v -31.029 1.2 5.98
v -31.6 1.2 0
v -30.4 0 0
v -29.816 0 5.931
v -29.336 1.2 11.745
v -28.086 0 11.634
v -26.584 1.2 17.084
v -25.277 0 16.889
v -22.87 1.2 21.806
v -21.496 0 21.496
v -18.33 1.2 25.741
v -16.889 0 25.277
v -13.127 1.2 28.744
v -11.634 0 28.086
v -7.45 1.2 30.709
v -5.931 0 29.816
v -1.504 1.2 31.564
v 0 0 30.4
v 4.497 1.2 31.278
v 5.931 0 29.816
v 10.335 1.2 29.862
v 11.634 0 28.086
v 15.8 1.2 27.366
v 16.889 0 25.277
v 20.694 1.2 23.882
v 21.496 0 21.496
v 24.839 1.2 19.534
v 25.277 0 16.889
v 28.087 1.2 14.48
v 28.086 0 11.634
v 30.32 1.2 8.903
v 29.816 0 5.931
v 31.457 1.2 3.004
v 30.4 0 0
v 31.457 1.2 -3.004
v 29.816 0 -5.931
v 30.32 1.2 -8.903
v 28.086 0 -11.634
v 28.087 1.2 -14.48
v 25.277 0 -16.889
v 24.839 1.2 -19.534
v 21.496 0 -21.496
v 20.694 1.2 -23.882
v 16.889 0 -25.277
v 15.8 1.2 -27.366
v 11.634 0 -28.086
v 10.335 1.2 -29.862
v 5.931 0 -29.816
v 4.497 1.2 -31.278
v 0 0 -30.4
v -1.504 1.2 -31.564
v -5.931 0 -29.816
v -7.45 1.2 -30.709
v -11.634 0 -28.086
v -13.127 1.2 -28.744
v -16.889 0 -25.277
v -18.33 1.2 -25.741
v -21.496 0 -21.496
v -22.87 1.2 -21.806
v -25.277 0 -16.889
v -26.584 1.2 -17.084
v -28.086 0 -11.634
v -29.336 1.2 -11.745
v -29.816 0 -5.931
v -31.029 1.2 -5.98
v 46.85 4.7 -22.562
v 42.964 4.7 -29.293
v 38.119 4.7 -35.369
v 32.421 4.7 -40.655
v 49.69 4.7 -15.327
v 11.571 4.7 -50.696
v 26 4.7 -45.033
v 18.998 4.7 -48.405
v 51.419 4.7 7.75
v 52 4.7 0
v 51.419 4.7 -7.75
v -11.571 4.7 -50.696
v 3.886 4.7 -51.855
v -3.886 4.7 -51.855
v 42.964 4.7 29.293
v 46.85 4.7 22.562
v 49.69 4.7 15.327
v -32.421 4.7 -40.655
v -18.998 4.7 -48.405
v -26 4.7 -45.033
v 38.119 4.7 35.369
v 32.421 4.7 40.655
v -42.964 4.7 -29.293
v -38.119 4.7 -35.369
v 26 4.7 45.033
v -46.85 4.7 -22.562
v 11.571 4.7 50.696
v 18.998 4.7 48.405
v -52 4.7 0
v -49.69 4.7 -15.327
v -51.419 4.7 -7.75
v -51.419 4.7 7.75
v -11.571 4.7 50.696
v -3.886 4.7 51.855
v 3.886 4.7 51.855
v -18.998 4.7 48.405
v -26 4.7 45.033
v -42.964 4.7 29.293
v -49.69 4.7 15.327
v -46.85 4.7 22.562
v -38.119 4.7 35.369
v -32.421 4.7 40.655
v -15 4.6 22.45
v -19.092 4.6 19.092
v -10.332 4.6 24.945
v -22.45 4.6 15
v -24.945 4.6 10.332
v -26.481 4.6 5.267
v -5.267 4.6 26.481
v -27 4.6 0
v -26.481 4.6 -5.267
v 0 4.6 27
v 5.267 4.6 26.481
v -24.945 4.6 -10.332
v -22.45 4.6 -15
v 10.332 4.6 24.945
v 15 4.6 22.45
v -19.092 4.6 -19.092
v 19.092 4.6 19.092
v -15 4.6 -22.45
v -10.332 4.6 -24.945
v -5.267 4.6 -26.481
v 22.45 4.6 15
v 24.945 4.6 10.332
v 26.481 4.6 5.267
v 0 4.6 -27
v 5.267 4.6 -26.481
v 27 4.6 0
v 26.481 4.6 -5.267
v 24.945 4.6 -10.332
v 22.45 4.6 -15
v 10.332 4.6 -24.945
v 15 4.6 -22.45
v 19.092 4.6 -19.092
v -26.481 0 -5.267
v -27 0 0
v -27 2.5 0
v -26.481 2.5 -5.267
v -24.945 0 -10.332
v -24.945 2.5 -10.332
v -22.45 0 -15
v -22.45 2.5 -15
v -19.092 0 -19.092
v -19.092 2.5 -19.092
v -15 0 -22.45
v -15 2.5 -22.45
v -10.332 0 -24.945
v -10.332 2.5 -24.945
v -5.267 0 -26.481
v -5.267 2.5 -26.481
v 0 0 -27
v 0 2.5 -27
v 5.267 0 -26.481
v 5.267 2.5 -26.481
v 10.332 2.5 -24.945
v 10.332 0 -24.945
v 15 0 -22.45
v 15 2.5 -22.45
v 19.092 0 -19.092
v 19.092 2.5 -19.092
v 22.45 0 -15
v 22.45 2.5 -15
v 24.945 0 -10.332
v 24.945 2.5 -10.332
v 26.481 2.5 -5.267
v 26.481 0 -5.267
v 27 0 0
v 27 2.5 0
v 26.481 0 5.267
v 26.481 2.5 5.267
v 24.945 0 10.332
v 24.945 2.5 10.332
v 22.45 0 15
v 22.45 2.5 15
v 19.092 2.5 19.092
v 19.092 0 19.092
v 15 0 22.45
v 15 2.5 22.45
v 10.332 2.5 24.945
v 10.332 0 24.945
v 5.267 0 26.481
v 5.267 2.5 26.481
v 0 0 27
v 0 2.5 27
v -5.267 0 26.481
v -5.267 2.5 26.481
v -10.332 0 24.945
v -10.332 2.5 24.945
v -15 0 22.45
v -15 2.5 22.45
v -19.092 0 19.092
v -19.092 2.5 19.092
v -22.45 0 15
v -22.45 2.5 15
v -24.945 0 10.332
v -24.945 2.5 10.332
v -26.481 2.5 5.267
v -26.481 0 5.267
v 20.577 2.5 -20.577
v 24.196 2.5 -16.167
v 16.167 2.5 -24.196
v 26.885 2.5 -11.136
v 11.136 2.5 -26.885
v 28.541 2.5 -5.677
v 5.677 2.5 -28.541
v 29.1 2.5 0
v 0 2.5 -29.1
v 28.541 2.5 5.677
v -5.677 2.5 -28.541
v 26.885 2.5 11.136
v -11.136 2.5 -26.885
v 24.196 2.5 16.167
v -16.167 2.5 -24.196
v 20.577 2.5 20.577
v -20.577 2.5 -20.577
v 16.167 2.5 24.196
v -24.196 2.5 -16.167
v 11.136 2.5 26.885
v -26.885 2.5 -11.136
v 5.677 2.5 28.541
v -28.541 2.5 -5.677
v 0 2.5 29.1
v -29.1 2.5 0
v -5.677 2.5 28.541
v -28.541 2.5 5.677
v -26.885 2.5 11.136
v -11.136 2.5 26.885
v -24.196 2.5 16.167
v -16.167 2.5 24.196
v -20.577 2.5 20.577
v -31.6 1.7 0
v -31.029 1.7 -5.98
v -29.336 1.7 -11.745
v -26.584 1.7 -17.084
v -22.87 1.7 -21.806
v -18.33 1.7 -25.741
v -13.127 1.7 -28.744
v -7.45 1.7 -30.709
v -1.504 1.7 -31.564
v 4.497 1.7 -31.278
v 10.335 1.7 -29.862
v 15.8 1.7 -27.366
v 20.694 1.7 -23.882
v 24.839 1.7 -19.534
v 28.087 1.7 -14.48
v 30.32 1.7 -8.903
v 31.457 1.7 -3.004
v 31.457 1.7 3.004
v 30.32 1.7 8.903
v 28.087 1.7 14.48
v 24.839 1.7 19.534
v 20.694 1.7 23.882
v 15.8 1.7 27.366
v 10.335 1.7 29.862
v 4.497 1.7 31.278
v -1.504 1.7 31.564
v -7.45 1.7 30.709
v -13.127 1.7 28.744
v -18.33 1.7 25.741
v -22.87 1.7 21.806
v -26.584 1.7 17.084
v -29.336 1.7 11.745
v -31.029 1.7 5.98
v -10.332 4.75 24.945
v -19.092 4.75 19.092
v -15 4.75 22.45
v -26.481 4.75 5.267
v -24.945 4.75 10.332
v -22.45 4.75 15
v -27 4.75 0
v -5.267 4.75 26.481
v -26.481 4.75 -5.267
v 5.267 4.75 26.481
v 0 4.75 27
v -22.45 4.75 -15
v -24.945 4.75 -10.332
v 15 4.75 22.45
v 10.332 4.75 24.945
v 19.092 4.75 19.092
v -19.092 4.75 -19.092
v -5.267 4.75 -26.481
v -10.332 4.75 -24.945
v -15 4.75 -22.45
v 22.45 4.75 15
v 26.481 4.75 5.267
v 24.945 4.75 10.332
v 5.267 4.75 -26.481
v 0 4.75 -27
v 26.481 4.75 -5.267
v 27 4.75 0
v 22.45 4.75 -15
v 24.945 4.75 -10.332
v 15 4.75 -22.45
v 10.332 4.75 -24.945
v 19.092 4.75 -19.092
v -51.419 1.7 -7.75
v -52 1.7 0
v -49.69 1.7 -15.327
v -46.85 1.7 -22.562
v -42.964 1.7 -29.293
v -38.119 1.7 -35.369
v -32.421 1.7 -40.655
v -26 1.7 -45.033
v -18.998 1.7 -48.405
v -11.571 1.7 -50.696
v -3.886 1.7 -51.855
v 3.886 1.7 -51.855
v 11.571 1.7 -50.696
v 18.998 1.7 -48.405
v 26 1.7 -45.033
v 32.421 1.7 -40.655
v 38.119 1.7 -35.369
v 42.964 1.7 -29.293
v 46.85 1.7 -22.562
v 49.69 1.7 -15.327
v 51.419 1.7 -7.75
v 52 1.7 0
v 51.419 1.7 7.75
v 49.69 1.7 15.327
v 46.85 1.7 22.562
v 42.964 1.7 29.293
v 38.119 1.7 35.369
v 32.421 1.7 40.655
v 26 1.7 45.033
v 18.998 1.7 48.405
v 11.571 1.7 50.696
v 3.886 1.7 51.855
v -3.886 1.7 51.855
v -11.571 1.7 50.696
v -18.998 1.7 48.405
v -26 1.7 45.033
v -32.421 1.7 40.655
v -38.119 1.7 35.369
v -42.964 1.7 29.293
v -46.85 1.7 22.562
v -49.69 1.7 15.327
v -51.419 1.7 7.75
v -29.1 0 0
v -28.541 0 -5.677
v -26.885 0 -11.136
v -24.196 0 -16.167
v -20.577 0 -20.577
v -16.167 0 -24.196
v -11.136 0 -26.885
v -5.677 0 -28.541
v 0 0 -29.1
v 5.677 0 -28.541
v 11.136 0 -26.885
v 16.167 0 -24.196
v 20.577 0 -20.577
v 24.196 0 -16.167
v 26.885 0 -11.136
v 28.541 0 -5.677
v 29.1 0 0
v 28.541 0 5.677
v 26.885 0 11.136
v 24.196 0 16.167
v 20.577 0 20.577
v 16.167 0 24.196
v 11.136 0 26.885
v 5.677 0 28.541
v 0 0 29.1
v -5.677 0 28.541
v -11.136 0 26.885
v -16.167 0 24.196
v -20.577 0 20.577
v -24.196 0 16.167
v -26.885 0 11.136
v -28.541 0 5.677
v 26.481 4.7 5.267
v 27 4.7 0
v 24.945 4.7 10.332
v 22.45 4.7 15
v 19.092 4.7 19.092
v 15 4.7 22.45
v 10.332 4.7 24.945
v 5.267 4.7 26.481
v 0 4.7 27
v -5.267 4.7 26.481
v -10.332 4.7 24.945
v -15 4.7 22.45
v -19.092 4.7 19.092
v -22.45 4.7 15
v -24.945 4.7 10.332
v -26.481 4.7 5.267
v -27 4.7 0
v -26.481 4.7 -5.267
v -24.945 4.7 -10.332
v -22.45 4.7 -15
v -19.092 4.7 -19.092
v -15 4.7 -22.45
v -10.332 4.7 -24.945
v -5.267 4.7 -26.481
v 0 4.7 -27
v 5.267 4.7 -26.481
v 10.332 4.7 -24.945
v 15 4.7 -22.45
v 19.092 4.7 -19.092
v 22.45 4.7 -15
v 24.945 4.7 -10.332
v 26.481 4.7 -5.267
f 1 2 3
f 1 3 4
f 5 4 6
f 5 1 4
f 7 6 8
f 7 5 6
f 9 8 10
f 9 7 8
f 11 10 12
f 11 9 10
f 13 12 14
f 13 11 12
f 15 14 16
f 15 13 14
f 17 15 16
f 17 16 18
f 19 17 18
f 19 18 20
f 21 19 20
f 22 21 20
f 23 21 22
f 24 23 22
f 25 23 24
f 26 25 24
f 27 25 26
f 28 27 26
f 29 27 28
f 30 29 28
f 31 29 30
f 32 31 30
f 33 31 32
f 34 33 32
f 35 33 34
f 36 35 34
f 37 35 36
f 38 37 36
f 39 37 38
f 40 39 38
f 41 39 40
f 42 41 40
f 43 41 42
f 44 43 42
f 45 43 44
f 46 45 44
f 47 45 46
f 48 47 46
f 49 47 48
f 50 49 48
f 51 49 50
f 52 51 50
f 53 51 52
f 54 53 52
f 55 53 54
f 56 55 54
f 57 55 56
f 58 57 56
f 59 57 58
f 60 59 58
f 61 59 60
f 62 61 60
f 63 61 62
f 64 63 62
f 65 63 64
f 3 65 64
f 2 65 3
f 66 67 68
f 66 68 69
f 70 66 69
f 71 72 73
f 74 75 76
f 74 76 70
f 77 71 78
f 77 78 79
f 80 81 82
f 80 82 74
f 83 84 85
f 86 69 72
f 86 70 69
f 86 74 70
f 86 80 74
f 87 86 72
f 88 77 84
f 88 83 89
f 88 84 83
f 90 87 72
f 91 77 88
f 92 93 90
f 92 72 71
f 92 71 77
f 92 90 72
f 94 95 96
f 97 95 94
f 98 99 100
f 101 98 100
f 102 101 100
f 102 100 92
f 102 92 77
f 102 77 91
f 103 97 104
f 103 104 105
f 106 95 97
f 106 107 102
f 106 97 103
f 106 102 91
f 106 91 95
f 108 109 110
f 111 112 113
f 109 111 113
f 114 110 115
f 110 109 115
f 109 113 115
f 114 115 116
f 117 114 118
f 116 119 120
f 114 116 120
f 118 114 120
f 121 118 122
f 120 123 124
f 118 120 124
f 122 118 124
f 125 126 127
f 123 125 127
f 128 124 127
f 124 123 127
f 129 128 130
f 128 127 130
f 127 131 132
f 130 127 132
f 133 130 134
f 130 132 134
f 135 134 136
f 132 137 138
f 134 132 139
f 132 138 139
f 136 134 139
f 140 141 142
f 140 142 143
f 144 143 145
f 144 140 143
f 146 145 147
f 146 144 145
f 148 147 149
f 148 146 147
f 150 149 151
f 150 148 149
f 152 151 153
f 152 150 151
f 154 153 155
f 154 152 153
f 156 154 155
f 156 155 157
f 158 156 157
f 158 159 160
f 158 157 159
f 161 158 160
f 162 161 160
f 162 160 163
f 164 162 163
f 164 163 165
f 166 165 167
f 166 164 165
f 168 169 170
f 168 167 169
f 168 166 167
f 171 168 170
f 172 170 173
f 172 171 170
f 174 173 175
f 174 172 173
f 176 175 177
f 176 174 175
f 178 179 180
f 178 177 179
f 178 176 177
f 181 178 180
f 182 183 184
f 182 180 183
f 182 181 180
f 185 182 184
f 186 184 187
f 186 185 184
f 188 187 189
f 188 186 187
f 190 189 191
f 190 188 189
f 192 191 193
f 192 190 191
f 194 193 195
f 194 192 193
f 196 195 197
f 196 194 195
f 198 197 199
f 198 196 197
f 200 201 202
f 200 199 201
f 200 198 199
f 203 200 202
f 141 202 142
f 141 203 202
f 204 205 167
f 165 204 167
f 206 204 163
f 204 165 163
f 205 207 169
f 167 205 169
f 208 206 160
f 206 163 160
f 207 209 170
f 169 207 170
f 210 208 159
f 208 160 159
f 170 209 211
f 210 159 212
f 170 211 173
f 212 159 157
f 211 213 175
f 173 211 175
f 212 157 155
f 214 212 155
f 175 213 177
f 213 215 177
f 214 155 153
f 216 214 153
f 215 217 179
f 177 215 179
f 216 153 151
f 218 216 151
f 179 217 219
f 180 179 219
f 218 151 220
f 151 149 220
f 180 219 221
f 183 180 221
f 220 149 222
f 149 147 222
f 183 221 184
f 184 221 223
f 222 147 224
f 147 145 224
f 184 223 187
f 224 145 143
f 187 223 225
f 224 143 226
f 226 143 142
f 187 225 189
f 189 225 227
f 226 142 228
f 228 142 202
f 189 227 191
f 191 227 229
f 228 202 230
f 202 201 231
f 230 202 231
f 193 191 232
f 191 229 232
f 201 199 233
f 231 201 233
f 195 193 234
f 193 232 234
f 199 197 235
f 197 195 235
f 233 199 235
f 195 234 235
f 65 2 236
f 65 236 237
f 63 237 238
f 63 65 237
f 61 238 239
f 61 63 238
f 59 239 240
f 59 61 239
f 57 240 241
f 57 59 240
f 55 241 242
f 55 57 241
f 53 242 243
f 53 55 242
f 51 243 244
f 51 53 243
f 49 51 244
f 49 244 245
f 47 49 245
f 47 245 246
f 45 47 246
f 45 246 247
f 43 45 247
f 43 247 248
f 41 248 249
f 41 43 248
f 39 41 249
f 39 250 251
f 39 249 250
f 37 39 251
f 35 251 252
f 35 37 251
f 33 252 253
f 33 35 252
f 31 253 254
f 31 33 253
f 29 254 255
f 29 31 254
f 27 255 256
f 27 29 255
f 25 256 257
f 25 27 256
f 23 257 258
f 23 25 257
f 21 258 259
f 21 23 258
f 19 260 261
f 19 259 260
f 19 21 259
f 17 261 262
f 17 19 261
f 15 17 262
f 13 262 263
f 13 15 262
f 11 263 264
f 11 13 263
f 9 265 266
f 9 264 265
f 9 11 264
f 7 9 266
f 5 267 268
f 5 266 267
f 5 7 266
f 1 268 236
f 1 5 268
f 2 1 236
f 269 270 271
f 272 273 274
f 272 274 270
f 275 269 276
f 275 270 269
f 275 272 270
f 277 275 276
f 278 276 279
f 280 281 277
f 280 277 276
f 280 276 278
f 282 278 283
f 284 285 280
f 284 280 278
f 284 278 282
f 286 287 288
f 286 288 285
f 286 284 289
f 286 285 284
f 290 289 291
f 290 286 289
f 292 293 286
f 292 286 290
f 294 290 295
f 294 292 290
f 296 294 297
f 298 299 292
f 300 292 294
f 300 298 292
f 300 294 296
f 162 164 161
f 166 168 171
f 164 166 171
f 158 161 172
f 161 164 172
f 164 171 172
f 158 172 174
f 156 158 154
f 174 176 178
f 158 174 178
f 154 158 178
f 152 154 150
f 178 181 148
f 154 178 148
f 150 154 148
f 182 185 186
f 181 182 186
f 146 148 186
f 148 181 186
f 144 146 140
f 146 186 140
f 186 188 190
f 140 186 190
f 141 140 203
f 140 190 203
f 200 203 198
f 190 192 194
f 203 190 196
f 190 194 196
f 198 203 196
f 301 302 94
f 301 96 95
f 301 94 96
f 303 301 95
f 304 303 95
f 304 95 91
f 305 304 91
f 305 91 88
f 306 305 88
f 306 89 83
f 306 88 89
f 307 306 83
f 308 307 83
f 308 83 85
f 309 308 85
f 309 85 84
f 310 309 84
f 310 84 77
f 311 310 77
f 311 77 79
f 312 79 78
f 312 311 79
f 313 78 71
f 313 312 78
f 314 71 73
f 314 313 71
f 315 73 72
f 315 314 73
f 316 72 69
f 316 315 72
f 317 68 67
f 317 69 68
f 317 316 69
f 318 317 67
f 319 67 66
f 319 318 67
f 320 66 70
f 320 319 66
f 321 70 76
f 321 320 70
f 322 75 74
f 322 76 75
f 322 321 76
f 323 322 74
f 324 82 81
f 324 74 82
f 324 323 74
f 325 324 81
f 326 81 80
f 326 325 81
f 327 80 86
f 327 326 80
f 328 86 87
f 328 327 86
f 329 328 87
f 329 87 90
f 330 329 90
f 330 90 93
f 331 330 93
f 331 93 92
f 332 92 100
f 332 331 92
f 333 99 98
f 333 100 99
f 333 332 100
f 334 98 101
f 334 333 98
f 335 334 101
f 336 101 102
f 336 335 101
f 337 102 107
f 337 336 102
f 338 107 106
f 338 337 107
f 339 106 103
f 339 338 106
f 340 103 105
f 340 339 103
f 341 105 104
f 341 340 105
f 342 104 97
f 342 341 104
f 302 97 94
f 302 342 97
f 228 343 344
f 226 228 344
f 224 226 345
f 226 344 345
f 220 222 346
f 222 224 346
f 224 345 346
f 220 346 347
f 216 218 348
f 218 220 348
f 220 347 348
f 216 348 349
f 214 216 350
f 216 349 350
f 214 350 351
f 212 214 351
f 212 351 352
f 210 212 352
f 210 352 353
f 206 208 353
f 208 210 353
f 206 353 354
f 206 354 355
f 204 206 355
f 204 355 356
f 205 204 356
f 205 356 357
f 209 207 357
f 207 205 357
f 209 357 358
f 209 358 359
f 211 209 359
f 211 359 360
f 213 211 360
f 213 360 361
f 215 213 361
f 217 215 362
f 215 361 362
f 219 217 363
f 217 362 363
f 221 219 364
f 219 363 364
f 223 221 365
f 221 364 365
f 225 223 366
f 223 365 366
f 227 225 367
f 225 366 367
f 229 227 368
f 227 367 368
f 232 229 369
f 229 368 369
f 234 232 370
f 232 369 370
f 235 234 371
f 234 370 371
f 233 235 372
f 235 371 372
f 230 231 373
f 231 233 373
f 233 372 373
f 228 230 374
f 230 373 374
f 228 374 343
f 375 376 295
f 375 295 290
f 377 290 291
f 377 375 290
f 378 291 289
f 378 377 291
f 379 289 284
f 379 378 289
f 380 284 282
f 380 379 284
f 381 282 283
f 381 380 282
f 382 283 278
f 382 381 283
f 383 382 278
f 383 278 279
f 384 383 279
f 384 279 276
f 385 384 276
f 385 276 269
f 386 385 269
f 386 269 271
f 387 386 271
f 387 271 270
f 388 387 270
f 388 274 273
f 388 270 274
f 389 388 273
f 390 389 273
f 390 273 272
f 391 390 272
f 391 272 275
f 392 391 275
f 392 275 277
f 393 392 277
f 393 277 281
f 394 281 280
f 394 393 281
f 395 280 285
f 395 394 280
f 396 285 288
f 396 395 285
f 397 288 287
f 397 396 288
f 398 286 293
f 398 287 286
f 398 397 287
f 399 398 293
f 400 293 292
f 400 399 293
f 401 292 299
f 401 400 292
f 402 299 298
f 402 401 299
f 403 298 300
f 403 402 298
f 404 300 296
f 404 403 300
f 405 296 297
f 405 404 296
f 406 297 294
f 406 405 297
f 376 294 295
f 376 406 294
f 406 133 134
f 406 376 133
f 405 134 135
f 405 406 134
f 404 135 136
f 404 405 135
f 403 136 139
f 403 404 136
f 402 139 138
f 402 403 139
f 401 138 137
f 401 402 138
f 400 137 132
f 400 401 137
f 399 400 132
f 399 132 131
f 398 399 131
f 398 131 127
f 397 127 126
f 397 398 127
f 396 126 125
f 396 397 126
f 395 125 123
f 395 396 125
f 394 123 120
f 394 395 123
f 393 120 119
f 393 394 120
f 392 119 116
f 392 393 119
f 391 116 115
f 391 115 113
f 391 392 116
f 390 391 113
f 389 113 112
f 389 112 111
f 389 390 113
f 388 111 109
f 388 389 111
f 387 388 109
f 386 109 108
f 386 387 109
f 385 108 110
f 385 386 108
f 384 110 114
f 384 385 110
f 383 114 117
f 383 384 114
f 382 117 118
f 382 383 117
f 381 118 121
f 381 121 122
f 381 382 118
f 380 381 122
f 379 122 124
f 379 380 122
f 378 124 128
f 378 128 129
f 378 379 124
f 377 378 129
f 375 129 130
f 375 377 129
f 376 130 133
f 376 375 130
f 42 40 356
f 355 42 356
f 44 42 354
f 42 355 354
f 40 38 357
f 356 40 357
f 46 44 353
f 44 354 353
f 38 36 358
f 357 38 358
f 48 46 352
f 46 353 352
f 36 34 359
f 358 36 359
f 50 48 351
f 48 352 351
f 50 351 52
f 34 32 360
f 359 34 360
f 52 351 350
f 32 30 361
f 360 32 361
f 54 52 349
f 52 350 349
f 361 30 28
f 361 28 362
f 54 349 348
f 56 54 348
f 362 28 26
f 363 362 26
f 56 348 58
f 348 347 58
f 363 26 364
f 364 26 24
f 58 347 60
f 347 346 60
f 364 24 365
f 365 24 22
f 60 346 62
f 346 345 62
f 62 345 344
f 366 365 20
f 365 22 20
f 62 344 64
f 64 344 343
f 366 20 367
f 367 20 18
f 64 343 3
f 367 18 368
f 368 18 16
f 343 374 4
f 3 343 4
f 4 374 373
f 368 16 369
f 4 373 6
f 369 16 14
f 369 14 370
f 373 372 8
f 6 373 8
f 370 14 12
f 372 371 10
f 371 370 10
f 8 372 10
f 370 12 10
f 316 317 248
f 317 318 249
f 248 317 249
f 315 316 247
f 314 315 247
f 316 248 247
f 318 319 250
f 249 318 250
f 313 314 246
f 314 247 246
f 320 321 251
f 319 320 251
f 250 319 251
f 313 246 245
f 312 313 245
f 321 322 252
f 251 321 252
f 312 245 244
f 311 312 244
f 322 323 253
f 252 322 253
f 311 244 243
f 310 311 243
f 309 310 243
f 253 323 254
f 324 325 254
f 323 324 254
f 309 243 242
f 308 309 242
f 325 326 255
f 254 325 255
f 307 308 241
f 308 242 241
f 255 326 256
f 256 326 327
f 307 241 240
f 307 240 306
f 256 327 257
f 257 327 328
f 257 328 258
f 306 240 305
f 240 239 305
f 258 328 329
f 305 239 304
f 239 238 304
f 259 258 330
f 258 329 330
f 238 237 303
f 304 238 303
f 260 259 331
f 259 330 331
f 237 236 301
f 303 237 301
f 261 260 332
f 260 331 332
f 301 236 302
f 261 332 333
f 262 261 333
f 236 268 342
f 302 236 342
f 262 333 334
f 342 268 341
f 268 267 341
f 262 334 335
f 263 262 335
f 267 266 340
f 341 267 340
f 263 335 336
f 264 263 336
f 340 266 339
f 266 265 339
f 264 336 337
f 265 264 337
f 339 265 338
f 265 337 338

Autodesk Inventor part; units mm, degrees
ref_plane "YZ Plane" through (0, 0, 0) normal (1, 0, 0) x (0, 1, 0)
ref_plane "XZ Plane" through (0, 0, 0) normal (0, 1, 0) x (-1, 0, 0)
ref_plane "XY Plane" through (0, 0, 0) normal (0, 0, 1) x (1, 0, 0)
sketch "Эскиз6" plane through (0, 0, 0) normal (0, 1, 0) x (-1, 0, 0)
  circle A0 centre (0, 0) radius 27
  circle A1 centre (0, 0) radius 29.1
  circle A2 centre (0, 0) radius 52
  circle A3 centre (0, 0) radius 31.6
  dimension "d16" = 54
  dimension "d17" = 58.2
  dimension "d18" = 104
  dimension "d23" = 63.2
extrude "Выдавливание4" add sketch "Эскиз6" along normal blind 4.7 contours A0 | A1 | A2 | A3
extrude "Выдавливание5" cut sketch "Эскиз6" along normal blind 2.5 contours A1
extrude "Выдавливание6" cut sketch "Эскиз6" along normal blind 1.7 contours A2
chamfer "Фаска1" distance 1.2 angle 45 1 edges at (31.6, 0, 0)
sketch "Эскиз7" plane through (0, 4.7, 0) normal (0, 1, 0) x (1, 0, 0)
  circle A0 centre (0, 0) radius 27 projected
extrude "Выдавливание7" add sketch "Эскиз7" along normal blind 0.05 and the other way blind 0.1 separate body
properties part number "lid" material "Полиэтилен, низкая плотность"
